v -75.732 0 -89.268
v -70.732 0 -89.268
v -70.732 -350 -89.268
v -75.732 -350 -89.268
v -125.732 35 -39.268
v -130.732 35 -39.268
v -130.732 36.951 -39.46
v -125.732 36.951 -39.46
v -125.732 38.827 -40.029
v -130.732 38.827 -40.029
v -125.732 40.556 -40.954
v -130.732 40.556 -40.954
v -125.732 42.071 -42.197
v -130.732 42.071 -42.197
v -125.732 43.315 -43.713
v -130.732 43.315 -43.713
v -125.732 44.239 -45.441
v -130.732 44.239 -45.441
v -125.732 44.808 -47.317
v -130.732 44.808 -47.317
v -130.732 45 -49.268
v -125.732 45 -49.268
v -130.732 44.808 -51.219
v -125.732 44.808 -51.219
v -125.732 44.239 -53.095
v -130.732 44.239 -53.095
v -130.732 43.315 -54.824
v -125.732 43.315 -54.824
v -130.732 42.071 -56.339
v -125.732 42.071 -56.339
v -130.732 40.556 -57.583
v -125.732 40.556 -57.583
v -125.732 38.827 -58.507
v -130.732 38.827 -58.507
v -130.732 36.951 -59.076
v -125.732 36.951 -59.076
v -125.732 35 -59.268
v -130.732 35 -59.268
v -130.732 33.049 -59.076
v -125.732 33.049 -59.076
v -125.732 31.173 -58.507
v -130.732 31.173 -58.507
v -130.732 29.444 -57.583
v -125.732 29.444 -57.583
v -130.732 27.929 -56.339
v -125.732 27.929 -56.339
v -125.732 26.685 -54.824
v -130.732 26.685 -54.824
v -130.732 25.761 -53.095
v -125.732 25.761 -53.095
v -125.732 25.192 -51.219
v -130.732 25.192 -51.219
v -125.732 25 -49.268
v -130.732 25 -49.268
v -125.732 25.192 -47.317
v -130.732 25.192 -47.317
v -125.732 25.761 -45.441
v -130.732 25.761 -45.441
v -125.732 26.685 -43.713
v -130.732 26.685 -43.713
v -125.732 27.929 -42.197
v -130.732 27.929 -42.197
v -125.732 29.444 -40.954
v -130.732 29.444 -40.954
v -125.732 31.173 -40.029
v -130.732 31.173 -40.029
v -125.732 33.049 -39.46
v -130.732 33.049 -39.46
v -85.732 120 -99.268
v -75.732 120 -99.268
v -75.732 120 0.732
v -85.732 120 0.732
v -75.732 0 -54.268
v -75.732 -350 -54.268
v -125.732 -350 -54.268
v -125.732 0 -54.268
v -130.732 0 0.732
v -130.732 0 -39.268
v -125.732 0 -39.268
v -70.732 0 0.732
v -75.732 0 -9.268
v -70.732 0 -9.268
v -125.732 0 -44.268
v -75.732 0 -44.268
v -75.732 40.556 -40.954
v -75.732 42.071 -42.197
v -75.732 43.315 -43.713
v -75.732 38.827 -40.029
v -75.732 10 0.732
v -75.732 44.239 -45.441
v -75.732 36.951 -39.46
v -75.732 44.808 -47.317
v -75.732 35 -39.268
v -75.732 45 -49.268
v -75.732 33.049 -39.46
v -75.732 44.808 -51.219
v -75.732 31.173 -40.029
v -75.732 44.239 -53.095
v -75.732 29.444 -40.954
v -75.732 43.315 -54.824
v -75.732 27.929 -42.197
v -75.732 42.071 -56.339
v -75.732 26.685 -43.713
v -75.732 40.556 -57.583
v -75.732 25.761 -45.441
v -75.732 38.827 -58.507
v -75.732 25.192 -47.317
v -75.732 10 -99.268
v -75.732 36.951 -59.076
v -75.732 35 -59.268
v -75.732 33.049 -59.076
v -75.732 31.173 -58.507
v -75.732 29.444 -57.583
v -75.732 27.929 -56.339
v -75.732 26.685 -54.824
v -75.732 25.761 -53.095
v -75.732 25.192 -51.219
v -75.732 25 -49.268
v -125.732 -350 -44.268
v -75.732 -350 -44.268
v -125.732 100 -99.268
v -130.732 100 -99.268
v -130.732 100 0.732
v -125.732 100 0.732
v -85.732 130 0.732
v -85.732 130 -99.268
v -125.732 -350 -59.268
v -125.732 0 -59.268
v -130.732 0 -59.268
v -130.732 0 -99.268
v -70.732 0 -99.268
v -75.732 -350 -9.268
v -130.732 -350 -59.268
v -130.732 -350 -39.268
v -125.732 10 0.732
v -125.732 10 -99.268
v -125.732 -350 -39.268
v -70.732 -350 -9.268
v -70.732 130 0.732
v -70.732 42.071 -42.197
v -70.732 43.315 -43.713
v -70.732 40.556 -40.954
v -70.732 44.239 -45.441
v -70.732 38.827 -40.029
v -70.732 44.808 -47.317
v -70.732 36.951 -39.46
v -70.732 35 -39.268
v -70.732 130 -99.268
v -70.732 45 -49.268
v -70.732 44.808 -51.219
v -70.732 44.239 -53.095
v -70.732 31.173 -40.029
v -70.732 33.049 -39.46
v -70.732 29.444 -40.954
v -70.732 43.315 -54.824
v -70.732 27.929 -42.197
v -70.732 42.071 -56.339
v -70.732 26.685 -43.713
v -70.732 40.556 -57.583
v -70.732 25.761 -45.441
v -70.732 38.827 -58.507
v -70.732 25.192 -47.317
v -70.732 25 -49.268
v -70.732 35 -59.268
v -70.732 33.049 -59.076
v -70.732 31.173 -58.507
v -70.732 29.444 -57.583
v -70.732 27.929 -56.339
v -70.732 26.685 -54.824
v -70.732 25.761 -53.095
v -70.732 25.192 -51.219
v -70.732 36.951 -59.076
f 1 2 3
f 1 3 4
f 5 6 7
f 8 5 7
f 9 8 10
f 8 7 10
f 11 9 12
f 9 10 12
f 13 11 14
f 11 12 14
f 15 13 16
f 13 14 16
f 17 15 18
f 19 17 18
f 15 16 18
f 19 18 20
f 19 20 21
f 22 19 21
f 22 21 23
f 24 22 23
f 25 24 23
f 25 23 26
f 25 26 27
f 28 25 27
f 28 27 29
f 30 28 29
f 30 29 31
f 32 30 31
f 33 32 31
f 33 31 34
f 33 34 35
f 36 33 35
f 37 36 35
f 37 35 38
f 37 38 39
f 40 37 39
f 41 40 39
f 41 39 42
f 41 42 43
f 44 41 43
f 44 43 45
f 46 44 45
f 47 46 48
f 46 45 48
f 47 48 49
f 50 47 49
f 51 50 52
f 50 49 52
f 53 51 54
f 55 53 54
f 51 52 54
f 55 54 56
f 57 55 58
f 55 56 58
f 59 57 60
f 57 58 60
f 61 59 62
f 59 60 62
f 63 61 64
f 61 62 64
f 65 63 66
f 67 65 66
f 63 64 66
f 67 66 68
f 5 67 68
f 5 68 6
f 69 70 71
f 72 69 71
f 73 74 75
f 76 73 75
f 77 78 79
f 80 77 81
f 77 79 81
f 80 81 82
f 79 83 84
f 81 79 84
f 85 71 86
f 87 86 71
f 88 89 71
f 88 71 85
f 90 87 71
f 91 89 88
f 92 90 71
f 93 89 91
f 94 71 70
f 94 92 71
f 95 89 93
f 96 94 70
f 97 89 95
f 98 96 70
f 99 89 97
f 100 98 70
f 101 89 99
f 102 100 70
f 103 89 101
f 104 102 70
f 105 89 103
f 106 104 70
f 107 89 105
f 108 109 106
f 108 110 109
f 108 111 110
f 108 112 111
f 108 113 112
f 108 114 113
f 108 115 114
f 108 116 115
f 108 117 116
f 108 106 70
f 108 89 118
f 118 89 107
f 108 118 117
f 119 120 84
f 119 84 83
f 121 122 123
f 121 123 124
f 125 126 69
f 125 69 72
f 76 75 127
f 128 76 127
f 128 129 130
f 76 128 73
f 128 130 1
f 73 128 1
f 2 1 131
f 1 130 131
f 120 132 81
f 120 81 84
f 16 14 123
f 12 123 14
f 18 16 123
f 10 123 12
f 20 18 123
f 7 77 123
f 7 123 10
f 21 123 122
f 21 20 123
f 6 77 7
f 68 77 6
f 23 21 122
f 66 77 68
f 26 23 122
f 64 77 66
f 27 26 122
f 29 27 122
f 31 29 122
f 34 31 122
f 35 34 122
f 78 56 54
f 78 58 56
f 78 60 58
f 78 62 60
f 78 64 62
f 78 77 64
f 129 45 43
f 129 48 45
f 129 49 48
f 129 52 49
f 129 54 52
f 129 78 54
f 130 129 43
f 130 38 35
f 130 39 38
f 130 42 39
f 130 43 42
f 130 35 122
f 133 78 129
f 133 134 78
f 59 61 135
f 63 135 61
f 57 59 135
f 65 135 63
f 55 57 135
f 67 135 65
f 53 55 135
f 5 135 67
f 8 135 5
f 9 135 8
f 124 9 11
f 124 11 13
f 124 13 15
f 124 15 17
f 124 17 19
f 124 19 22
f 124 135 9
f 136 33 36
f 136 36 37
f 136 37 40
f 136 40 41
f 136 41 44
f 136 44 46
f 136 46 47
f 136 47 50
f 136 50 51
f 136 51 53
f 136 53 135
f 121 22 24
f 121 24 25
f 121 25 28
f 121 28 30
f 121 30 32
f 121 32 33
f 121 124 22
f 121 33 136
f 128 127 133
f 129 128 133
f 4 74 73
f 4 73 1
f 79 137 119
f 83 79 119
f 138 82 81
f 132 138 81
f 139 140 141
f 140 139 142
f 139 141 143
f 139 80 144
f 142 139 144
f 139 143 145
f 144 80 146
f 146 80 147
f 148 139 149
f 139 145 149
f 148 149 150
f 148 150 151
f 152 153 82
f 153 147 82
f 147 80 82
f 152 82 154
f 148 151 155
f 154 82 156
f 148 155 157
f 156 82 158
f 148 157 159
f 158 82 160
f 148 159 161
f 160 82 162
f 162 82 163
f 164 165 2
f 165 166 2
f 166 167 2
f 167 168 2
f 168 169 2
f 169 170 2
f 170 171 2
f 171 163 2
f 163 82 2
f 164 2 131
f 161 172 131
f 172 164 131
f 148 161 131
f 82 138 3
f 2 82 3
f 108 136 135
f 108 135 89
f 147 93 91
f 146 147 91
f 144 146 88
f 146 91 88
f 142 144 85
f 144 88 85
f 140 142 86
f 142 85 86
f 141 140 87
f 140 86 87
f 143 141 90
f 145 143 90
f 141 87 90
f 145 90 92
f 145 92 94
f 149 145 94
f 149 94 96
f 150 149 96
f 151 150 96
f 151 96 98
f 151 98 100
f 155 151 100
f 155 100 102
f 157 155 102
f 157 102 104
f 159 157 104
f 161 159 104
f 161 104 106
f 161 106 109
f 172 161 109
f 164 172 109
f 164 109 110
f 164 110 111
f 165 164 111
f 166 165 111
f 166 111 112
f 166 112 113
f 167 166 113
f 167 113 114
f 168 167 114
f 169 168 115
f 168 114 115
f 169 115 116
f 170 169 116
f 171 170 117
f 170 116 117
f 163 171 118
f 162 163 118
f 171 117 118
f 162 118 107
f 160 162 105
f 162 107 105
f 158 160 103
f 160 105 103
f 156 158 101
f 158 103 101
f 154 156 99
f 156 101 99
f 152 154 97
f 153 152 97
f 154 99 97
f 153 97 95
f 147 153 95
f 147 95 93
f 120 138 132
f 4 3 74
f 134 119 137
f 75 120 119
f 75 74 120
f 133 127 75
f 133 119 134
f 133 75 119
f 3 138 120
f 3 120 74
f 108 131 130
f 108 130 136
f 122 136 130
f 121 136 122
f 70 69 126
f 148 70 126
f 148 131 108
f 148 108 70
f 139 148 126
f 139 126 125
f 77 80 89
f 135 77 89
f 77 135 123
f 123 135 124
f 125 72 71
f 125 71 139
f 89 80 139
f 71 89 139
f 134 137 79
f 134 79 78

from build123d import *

# Parameters (mm, degrees)
SKETCH1_W           = 60
SKETCH1_H           = 100
BOSS_EXTRUDE1_DEPTH = 100
SKETCH2_W           = 50
SKETCH2_H           = 100
CUT_EXTRUDE1_DEPTH  = 40
SKETCH3_W           = 5
SKETCH3_H           = 100
BOSS_EXTRUDE2_DEPTH = 30
SKETCH4_W           = 100
SKETCH4_H           = 10
BOSS_EXTRUDE3_DEPTH = 10
SKETCH5_W           = 60
SKETCH5_H           = 80
BOSS_EXTRUDE4_DEPTH = 350
SKETCH6_W           = 50
SKETCH6_H           = 100
CUT_EXTRUDE2_DEPTH  = 50
SKETCH7_R           = 10
CUT_EXTRUDE3_DEPTH  = 80
SKETCH8_W           = 50
SKETCH8_H           = 35
CUT_EXTRUDE4_DEPTH  = 350
SKETCH9_W           = 5
SKETCH9_H           = 30
CUT_EXTRUDE5_DEPTH  = 350


with BuildPart() as part:
    # Sketch1 → Boss-Extrude1 (new body)
    with BuildSketch(Plane(origin=(0, 0, 0), x_dir=(1, 0, 0), z_dir=(0, 1, 0))):
        with Locations((-100.731707317, 49.268292683)):
            Rectangle(SKETCH1_W, SKETCH1_H)
    extrude(amount=BOSS_EXTRUDE1_DEPTH)

    # Sketch2 → Cut-Extrude1 (cut)
    with BuildSketch(Plane(origin=(0, 100, 0), x_dir=(1, 0, 0), z_dir=(0, 1, 0))):
        with Locations((-100.731707317, 49.268292683)):
            Rectangle(SKETCH2_W, SKETCH2_H)
    extrude(amount=-CUT_EXTRUDE1_DEPTH, mode=Mode.SUBTRACT)

    # Sketch3 → Boss-Extrude2 (add)
    with BuildSketch(Plane(origin=(0, 100, 0), x_dir=(1, 0, 0), z_dir=(0, 1, 0))):
        with Locations((-73.231707317, 49.268292683)):
            Rectangle(SKETCH3_W, SKETCH3_H)
    extrude(amount=BOSS_EXTRUDE2_DEPTH)

    # Sketch4 → Boss-Extrude3 (add)
    with BuildSketch(Plane.ZY.offset(75.731707317)):
        with Locations((-49.268292683, 125)):
            Rectangle(SKETCH4_W, SKETCH4_H)
    extrude(amount=BOSS_EXTRUDE3_DEPTH)

    # Sketch5 → Boss-Extrude4 (add)
    with BuildSketch(Plane(origin=(0, 0, 0), x_dir=(-1, 0, 0), z_dir=(0, -1, 0))):
        with Locations((100.731707317, 49.268292683)):
            Rectangle(SKETCH5_W, SKETCH5_H)
    extrude(amount=BOSS_EXTRUDE4_DEPTH)

    # Sketch6 → Cut-Extrude2 (cut)
    with BuildSketch(Plane(origin=(0, 60, 0), x_dir=(1, 0, 0), z_dir=(0, 1, 0))):
        with Locations((-100.731707317, 49.268292683)):
            Rectangle(SKETCH6_W, SKETCH6_H)
    extrude(amount=-CUT_EXTRUDE2_DEPTH, mode=Mode.SUBTRACT)

    # Sketch7 → Cut-Extrude3 (cut)
    with BuildSketch(Plane.ZY.offset(130.731707317)):
        with Locations((-49.268292683, 35)):
            Circle(SKETCH7_R)
    extrude(amount=-CUT_EXTRUDE3_DEPTH, mode=Mode.SUBTRACT)

    # Sketch8 → Cut-Extrude4 (cut)
    with BuildSketch(Plane(origin=(0, -350, 0), x_dir=(-1, 0, 0), z_dir=(0, -1, 0))):
        with Locations((100.731707317, 26.768292683)):
            Rectangle(SKETCH8_W, SKETCH8_H)
        with Locations((100.731707317, 71.768292683)):
            Rectangle(SKETCH8_W, SKETCH8_H)
    extrude(amount=-CUT_EXTRUDE4_DEPTH, mode=Mode.SUBTRACT)

    # Sketch9 → Cut-Extrude5 (cut)
    with BuildSketch(Plane(origin=(0, -350, 0), x_dir=(-1, 0, 0), z_dir=(0, -1, 0))):
        with Locations((128.231707317, 74.268292683)):
            Rectangle(SKETCH9_W, SKETCH9_H)
        with Locations((128.231707317, 24.268292683)):
            Rectangle(SKETCH9_W, SKETCH9_H)
    extrude(amount=-CUT_EXTRUDE5_DEPTH, mode=Mode.SUBTRACT)


solid = part.part
